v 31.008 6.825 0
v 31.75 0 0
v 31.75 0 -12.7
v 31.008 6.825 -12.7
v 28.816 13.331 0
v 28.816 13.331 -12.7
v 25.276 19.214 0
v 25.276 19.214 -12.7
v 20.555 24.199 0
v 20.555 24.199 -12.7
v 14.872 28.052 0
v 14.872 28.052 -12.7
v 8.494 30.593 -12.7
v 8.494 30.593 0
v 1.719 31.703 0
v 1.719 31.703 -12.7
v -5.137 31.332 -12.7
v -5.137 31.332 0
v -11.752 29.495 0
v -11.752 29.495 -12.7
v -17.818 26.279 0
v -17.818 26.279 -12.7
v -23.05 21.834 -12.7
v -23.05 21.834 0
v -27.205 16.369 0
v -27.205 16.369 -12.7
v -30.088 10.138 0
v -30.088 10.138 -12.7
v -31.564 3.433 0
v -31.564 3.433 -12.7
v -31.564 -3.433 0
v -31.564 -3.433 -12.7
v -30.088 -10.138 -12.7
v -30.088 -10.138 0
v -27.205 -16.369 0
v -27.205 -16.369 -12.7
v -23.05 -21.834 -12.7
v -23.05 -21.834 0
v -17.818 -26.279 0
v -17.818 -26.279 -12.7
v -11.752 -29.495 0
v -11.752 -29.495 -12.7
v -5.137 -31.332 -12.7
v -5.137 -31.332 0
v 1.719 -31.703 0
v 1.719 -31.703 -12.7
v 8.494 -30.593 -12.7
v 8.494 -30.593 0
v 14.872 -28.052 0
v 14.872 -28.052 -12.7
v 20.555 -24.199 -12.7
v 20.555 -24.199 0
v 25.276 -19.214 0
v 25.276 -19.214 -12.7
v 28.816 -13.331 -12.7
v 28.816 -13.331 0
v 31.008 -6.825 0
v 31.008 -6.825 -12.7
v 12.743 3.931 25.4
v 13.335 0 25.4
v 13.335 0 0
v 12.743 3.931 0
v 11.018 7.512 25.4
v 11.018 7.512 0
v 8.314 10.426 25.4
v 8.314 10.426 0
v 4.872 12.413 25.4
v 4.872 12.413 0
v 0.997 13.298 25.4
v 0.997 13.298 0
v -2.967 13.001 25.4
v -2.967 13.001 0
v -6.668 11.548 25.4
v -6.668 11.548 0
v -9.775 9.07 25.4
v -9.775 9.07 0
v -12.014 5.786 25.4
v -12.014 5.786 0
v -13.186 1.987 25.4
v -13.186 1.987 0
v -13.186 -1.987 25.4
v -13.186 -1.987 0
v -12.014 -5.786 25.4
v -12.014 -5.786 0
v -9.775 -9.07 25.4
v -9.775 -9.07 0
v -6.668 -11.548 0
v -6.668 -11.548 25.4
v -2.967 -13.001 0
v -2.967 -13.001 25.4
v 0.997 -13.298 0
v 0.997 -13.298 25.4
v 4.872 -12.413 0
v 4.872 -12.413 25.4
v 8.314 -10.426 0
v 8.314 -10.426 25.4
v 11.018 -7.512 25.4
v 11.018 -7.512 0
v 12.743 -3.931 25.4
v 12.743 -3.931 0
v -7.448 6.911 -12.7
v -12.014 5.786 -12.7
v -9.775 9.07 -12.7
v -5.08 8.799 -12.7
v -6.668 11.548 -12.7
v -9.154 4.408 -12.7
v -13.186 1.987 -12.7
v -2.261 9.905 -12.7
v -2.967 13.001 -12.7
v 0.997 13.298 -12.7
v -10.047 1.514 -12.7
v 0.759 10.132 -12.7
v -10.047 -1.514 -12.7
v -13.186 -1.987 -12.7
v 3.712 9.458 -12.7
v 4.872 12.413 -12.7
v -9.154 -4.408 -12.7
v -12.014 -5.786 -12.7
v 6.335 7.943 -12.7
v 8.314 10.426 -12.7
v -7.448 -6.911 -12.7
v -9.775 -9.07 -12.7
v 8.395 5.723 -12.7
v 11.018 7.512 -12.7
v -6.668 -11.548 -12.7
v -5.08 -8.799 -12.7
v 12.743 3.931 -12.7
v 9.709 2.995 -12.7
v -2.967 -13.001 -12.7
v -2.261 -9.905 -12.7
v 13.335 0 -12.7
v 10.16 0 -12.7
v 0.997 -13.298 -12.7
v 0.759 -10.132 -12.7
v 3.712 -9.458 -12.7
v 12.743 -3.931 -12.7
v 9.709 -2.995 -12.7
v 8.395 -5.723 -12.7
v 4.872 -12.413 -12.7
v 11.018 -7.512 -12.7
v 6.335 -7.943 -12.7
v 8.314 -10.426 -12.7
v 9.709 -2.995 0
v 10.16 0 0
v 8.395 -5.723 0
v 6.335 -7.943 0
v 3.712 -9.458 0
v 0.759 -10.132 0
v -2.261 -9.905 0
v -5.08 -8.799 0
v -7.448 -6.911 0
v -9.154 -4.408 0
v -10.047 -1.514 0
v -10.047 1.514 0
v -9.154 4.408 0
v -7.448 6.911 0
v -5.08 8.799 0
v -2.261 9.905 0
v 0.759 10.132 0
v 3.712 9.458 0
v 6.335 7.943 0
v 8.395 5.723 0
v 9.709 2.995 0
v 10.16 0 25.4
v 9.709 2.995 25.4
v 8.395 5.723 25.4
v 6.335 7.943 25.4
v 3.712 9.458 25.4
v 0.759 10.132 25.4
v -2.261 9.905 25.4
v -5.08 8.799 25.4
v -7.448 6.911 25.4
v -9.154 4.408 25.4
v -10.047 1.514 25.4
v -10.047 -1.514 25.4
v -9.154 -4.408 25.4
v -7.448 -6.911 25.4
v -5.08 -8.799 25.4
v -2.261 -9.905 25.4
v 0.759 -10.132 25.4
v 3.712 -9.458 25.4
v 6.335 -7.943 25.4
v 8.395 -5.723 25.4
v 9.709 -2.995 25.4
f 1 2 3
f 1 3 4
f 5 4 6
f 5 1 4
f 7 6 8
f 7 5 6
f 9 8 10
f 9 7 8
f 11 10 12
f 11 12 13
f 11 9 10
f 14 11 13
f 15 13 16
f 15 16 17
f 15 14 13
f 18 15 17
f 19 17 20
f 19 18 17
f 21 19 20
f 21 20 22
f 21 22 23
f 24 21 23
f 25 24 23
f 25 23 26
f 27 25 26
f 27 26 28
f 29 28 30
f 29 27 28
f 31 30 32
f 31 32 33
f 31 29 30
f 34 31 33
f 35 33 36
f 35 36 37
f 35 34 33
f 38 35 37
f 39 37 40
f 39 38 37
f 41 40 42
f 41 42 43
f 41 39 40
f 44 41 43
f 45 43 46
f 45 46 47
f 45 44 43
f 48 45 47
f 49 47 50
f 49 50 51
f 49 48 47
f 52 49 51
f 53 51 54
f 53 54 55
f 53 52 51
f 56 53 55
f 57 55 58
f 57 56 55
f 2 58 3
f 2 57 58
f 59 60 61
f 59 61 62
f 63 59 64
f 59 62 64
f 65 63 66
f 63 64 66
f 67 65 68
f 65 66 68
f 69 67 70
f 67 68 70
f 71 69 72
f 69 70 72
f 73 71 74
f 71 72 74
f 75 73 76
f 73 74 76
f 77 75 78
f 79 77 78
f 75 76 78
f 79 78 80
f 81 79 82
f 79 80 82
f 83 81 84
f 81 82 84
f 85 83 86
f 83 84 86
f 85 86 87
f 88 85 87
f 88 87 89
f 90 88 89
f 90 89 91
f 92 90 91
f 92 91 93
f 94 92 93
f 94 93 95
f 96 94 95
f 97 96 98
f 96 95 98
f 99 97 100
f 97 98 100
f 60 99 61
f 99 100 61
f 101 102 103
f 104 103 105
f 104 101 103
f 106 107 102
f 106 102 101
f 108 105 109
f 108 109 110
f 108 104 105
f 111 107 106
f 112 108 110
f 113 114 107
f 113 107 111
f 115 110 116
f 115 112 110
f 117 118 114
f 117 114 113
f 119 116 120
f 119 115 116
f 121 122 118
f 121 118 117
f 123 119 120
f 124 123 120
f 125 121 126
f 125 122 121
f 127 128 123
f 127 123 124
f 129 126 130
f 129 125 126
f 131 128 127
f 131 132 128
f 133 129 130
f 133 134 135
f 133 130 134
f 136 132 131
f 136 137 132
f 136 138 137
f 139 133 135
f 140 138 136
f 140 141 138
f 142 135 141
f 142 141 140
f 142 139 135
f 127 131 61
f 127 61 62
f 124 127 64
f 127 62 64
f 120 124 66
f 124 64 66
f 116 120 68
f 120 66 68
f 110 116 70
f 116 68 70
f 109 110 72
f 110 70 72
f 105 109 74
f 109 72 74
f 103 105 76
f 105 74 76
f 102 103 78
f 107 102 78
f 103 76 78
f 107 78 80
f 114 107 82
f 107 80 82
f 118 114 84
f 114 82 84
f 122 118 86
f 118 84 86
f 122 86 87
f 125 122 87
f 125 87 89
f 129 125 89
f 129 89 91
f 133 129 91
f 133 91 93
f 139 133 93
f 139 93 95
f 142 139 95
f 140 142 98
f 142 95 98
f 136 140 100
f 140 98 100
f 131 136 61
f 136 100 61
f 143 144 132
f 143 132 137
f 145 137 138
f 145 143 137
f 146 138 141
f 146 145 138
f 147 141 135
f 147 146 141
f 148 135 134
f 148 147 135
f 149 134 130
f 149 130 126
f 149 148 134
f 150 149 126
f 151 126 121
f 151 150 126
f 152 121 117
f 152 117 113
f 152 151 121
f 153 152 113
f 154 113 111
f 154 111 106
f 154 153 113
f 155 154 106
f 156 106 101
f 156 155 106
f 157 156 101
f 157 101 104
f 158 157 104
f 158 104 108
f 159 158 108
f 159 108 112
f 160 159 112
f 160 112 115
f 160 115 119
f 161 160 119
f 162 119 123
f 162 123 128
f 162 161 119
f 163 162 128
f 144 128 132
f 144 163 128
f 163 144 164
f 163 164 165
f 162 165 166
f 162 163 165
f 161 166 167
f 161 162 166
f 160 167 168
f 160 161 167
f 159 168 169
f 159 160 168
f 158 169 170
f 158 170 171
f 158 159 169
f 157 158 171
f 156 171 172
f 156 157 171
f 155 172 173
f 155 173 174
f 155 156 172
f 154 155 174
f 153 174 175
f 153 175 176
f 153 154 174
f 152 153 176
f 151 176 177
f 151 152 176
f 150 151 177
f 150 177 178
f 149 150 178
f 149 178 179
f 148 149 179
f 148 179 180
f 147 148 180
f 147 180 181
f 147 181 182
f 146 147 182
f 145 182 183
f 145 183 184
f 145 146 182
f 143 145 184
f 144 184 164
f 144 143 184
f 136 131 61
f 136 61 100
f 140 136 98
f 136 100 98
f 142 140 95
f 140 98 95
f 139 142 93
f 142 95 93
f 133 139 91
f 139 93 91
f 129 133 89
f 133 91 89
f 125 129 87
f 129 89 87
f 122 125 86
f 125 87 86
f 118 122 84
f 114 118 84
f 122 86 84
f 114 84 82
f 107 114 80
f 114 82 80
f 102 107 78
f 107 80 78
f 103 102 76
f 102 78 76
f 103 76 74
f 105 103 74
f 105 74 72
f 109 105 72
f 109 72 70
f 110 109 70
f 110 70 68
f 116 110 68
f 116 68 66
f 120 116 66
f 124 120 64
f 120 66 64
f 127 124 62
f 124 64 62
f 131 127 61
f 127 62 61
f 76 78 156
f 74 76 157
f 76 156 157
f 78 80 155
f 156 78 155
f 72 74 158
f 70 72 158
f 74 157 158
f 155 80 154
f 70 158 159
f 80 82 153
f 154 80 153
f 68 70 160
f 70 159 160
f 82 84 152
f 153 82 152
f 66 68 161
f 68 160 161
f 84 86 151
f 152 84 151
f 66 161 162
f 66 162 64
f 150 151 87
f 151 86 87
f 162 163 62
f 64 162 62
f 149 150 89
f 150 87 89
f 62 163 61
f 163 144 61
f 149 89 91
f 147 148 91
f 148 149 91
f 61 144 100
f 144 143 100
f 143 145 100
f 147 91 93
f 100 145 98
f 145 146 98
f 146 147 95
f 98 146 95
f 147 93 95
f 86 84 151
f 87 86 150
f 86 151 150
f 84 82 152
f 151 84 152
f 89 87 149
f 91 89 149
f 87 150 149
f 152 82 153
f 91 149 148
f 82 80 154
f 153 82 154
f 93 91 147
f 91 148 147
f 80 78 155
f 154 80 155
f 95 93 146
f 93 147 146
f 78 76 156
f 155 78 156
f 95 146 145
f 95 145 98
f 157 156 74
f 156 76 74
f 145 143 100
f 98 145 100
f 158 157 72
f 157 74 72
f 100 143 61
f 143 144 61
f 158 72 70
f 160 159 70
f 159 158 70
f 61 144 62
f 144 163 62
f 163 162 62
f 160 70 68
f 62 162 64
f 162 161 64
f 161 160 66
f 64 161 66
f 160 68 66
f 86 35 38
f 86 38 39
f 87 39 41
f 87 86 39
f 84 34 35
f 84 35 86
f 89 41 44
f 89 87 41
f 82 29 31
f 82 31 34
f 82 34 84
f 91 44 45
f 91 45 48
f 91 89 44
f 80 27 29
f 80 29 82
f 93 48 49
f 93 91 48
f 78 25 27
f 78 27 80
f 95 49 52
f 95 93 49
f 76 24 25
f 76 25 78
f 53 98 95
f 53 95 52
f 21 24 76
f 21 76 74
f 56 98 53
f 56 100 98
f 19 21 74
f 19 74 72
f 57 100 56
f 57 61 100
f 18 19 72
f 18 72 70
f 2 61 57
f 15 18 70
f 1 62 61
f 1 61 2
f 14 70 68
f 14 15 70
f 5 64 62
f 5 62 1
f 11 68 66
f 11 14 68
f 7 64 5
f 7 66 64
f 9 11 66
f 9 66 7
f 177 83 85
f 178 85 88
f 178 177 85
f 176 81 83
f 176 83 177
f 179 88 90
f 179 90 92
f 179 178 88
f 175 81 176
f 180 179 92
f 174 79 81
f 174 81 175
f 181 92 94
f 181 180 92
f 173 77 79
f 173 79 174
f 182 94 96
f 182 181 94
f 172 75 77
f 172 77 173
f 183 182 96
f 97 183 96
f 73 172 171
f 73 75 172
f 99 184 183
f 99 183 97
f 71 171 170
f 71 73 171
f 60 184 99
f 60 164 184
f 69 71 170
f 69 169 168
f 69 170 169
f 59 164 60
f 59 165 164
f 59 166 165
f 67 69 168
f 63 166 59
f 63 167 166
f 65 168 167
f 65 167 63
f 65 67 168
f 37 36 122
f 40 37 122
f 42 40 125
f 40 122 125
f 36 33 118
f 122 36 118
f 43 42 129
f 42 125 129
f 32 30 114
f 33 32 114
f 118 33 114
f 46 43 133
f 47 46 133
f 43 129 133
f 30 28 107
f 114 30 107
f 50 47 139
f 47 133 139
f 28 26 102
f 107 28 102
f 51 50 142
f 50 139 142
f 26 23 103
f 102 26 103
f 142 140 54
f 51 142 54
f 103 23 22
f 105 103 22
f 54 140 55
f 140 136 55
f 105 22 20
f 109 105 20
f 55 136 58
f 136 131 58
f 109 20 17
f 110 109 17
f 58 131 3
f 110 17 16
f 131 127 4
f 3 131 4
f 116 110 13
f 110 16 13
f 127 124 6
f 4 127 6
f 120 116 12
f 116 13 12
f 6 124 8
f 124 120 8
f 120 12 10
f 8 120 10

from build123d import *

# Parameters (mm, degrees)
F0_R        = 13.335
F0_R_2      = 10.16
F1_DEPTH    = 25.4
F0_R_3      = 31.75
F2_DEPTH    = 12.7
F1_FACE_R   = 13.335
F1_FACE_R_2 = 10.16
F3_DEPTH    = 12.7


with BuildPart() as f1:
    # F0 (on Top) → F1 (new body)
    with BuildSketch(Plane.XY):
        Circle(F0_R)
        Circle(F0_R_2, mode=Mode.SUBTRACT)
    extrude(amount=F1_DEPTH)


with BuildPart() as f2:
    # F0 (on Top) → F2 (new body)
    with BuildSketch(Plane.XY):
        Circle(F0_R_3)
        Circle(F0_R, mode=Mode.SUBTRACT)
    extrude(amount=-F2_DEPTH)


with BuildPart() as f3:
    # F1_face (on face) → F3 (new body, through all)
    with BuildSketch(Plane(origin=(0, 0, 0), x_dir=(1, 0, 0), z_dir=(0, 0, -1))):
        Circle(F1_FACE_R)
        Circle(F1_FACE_R_2, mode=Mode.SUBTRACT)
    extrude(amount=F3_DEPTH)


solid = Compound([f1.part, f2.part, f3.part])
